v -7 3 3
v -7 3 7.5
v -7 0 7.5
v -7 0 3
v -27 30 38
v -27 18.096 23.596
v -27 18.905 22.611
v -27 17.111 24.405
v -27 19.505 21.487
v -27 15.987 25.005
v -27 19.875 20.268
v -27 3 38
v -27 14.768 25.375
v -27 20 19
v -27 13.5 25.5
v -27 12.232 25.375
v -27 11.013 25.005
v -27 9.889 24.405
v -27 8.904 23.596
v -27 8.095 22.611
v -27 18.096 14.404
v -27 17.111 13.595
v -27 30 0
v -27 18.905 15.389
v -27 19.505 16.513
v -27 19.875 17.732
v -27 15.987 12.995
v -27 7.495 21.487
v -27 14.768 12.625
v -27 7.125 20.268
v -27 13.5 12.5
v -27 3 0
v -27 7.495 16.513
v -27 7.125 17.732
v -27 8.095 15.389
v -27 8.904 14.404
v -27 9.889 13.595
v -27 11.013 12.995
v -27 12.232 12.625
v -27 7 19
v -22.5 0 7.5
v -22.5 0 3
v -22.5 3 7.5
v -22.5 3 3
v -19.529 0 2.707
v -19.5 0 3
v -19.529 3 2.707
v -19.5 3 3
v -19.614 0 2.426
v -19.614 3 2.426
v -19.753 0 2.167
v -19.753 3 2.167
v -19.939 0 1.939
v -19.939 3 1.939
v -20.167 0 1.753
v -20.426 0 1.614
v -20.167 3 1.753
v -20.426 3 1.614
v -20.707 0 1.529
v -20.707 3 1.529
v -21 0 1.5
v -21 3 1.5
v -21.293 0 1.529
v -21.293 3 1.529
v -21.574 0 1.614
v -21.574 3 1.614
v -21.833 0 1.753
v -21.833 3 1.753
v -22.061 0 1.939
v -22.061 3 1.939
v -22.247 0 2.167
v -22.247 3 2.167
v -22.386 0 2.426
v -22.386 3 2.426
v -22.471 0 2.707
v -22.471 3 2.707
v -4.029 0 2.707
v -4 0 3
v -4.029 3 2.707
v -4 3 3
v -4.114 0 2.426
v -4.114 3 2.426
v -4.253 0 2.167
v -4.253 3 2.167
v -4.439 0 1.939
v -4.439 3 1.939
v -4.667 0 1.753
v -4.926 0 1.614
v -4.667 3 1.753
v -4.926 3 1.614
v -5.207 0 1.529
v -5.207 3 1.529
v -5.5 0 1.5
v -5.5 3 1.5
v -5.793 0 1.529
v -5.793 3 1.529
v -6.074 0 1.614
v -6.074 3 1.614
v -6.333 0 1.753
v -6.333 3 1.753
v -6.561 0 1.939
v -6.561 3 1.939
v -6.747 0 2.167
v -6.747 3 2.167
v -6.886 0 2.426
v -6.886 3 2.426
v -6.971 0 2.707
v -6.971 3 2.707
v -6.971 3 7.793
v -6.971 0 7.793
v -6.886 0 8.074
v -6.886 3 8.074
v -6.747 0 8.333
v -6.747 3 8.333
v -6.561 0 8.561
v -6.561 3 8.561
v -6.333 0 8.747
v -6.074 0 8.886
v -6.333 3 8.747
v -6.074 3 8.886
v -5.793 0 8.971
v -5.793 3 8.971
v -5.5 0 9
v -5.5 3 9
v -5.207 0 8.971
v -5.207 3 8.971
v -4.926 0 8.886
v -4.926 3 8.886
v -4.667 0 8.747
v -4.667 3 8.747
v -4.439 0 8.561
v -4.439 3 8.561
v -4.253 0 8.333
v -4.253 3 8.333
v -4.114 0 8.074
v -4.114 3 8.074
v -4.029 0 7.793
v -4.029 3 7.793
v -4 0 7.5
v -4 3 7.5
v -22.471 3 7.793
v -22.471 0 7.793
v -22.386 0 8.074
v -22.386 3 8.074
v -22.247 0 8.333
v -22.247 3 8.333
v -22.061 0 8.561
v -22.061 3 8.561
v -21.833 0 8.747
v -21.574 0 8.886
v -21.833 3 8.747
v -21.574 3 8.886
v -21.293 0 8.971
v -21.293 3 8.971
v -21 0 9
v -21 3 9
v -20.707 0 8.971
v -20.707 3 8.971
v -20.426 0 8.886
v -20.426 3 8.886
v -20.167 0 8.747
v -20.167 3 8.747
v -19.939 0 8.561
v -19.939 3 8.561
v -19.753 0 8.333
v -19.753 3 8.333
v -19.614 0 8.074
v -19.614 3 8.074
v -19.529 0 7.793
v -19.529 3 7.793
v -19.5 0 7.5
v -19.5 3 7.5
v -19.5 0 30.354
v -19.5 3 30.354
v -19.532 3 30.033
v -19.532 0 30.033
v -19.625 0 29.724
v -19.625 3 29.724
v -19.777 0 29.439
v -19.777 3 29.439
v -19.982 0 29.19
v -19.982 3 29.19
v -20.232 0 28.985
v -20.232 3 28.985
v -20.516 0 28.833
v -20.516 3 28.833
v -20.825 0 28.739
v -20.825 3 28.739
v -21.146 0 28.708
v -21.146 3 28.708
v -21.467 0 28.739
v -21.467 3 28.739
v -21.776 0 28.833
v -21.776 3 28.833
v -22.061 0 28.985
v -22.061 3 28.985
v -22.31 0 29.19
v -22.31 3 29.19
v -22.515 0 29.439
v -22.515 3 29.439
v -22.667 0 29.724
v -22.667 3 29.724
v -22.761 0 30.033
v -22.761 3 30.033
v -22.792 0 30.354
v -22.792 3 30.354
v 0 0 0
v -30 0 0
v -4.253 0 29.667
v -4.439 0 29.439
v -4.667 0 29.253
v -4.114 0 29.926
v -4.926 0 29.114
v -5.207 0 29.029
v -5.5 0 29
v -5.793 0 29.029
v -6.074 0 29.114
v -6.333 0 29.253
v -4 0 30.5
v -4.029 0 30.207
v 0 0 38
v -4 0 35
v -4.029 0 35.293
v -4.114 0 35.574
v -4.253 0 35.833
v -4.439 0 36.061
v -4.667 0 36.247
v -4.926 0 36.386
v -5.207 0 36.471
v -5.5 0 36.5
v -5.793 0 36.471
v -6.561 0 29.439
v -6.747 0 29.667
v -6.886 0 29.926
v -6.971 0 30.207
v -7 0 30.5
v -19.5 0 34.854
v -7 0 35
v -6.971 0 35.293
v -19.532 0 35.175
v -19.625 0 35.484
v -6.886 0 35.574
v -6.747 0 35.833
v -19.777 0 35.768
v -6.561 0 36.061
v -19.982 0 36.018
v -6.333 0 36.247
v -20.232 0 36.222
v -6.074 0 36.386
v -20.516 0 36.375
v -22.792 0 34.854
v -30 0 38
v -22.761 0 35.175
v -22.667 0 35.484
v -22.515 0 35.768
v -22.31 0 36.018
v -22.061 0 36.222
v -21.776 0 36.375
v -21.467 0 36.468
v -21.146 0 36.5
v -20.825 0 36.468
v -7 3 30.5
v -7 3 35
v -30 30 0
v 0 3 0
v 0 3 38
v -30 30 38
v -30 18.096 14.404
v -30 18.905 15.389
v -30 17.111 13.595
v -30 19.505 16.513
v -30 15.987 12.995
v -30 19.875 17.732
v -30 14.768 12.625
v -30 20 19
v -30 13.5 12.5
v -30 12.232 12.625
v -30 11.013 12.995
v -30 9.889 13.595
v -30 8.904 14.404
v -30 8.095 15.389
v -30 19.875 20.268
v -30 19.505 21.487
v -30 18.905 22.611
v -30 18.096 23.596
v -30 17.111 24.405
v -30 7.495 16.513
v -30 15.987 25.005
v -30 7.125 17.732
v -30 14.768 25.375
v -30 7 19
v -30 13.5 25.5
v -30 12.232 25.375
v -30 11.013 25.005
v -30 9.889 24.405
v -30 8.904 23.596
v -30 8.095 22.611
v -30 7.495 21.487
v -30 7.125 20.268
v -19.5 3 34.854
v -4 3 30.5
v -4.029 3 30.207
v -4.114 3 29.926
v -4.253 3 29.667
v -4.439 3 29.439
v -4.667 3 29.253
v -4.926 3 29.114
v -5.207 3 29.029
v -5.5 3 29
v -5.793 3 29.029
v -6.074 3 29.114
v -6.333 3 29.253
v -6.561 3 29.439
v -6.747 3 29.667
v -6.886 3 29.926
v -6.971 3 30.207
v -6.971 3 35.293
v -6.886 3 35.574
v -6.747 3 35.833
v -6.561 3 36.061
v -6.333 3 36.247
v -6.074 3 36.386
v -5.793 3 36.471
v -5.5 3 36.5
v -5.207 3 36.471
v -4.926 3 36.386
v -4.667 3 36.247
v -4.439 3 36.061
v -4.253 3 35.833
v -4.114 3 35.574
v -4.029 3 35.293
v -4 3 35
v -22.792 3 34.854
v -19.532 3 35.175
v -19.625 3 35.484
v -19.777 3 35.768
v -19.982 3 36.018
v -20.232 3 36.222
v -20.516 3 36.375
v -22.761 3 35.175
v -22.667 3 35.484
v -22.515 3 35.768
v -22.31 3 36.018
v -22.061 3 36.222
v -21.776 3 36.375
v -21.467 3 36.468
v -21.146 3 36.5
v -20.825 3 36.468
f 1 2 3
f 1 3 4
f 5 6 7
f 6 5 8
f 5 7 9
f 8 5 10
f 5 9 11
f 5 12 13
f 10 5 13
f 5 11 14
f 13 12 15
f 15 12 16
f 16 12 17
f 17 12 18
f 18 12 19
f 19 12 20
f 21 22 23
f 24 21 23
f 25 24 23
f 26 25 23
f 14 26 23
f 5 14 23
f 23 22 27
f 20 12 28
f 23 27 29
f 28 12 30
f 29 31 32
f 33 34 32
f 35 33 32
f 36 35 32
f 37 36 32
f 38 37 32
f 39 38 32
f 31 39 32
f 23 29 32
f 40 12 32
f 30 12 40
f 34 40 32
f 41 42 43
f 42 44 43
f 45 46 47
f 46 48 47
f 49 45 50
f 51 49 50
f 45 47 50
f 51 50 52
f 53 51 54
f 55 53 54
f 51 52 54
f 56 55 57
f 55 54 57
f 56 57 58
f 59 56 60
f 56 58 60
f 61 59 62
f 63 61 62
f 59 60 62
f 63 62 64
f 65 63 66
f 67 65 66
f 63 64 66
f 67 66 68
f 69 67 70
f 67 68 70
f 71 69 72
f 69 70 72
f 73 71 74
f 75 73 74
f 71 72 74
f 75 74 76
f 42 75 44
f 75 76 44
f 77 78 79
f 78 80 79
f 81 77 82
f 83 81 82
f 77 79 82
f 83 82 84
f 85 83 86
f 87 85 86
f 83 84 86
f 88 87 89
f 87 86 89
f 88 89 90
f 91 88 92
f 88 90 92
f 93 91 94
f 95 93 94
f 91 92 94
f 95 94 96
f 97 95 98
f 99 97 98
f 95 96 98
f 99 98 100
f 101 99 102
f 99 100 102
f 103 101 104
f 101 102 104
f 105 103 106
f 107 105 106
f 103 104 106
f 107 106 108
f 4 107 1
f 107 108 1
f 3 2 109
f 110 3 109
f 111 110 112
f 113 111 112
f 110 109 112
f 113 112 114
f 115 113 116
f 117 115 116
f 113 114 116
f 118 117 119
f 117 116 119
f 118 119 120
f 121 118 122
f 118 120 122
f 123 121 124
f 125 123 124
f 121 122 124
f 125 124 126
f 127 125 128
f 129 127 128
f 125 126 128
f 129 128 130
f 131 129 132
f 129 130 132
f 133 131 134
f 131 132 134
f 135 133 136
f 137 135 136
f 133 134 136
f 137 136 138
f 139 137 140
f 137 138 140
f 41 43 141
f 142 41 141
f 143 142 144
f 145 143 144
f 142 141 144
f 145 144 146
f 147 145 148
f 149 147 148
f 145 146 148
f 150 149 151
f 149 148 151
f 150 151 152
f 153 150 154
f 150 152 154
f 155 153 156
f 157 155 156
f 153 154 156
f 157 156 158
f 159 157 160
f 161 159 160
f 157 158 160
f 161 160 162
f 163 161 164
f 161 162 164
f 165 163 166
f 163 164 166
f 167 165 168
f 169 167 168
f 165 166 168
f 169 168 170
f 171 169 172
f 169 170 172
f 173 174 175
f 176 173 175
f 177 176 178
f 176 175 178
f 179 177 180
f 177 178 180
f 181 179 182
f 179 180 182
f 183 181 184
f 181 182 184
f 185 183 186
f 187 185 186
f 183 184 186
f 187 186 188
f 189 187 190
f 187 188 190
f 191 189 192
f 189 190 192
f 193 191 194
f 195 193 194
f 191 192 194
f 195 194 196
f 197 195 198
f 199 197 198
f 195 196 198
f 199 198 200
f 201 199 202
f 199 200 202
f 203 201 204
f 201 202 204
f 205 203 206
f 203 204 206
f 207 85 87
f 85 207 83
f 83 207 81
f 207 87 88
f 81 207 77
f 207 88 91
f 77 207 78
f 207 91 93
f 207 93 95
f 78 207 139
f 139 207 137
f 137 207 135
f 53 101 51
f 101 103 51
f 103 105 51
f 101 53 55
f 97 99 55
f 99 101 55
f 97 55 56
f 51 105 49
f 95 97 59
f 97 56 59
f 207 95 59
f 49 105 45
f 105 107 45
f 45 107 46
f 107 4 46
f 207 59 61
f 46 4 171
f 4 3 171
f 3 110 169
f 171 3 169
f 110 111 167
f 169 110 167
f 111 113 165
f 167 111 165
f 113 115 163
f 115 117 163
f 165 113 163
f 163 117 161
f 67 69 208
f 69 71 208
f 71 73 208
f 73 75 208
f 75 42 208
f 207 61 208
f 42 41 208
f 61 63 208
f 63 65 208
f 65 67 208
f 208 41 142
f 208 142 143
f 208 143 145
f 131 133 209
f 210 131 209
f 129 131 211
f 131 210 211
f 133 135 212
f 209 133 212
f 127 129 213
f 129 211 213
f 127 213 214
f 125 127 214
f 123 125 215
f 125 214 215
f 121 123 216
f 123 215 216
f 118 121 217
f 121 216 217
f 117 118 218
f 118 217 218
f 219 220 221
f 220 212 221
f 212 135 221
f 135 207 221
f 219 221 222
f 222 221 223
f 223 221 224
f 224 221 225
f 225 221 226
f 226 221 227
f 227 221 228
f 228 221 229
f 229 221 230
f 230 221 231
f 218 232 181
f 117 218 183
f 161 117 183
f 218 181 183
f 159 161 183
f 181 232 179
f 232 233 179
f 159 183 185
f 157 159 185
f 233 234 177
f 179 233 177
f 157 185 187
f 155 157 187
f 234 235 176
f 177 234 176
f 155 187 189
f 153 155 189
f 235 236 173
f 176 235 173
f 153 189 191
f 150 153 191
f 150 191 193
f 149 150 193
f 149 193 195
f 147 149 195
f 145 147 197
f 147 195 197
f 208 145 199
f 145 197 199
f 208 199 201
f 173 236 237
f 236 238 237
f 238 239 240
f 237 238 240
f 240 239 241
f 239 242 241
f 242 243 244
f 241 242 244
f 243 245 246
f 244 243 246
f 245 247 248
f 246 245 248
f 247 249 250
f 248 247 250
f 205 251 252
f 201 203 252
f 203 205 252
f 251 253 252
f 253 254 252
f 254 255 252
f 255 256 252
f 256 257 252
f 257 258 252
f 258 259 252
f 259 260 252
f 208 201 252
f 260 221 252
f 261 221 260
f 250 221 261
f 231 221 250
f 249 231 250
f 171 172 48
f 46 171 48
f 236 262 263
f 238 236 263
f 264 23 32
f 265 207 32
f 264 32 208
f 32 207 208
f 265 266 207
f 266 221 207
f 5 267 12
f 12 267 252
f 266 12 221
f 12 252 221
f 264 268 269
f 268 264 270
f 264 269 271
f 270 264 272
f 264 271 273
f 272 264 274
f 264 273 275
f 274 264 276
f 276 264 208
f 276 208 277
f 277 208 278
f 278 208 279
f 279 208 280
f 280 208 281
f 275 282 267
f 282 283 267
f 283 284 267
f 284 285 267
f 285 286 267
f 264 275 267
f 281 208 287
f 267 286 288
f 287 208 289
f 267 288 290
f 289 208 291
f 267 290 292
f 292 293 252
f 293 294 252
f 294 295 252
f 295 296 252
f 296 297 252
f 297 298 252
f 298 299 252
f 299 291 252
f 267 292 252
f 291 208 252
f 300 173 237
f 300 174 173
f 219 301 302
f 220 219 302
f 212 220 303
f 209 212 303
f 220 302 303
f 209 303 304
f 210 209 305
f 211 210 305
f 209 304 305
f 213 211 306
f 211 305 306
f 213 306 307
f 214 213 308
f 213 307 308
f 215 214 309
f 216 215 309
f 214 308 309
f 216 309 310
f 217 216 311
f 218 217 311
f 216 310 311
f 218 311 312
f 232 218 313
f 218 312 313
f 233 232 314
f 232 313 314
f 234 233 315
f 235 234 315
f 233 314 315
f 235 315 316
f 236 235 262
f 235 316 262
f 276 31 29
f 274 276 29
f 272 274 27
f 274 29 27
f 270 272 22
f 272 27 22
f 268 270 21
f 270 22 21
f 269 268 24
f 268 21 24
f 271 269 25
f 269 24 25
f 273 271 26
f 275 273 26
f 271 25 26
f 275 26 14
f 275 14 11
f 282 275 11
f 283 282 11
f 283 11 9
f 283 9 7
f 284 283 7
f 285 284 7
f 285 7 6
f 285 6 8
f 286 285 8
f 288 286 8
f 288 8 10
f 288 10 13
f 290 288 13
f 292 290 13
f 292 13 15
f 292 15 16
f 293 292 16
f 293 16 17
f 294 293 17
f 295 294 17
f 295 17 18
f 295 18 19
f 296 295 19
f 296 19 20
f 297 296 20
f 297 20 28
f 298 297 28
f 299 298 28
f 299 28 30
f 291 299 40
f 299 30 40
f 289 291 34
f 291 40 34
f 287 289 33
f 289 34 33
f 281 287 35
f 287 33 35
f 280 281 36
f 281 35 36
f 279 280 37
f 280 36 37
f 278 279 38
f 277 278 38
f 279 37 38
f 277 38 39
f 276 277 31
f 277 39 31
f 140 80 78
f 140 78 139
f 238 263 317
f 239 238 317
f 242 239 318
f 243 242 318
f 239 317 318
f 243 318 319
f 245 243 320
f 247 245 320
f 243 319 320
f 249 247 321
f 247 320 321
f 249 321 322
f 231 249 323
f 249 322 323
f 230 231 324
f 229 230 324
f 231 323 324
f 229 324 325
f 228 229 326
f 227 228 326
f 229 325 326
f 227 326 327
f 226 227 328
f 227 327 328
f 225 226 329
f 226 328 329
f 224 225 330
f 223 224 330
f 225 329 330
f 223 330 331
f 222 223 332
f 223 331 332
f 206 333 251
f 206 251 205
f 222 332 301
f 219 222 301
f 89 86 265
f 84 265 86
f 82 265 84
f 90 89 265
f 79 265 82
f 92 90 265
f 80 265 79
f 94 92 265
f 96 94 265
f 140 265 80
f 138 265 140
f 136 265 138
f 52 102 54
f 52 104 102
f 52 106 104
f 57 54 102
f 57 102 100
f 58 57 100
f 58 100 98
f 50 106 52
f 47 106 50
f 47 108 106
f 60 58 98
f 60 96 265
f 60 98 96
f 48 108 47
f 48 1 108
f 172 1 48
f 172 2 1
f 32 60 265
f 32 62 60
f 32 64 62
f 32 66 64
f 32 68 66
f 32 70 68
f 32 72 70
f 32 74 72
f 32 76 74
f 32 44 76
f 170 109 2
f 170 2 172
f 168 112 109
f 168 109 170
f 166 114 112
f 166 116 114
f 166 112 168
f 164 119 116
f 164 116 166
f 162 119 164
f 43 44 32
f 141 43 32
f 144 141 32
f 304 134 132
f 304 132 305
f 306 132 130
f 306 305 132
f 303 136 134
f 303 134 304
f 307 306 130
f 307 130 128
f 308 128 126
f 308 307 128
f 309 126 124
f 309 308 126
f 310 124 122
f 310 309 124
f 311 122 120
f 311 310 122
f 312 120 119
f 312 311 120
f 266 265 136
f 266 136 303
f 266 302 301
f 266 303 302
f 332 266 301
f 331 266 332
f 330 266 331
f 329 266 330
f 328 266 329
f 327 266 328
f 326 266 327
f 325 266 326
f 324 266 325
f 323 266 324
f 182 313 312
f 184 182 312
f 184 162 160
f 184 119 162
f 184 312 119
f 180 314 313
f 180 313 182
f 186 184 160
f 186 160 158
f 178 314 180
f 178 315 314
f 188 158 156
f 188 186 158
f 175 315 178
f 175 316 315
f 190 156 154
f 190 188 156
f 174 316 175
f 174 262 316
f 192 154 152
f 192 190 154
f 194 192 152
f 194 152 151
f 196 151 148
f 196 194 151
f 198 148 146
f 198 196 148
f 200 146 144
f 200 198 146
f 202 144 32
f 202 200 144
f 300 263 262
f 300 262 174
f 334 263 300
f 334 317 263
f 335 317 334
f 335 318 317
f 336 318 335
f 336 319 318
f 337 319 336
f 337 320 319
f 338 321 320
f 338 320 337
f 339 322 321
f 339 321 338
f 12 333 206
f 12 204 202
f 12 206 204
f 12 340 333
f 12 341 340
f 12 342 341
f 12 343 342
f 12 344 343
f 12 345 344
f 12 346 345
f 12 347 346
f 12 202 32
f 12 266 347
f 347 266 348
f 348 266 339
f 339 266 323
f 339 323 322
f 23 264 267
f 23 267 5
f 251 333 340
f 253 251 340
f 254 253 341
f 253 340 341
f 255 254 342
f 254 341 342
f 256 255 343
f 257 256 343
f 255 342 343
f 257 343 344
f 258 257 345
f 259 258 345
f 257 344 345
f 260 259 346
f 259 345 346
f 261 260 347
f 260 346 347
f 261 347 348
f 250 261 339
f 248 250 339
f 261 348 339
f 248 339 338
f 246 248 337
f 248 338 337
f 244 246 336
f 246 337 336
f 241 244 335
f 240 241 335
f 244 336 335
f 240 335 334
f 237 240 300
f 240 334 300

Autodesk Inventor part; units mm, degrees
ref_plane "YZ Plane" through (0, 0, 0) normal (1, 0, 0) x (0, 1, 0)
ref_plane "XZ Plane" through (0, 0, 0) normal (0, 1, 0) x (-1, 0, 0)
ref_plane "XY Plane" through (0, 0, 0) normal (0, 0, 1) x (1, 0, 0)
sketch "Sketch1" plane through (0, 0, 0) normal (0, 1, 0) x (-1, 0, 0)
  line L0 (0, 0) -> (30, 0)
  line L1 (30, 0) -> (30, 38)
  line L2 (30, 38) -> (0, 38)
  line L3 (0, 38) -> (0, 0)
  dimension "d0" = 38
  dimension "d1" = 30
extrude "Extrusion1" add sketch "Sketch1" along normal blind 3
sketch "Sketch2" plane through (0, 3, 0) normal (0, 1, 0) x (1, 0, 0)
  line L0 (-30, 0) -> (-30, -38) projected
  line L1 (0, 0) -> (-30, 0) projected
  line L2 (-30, -38) -> (-27, -38)
  line L3 (-27, -38) -> (-27, 0)
  line L4 (-27, 0) -> (-30, 0)
  line L5 (-30, 0) -> (-30, -38)
  dimension "d4" = 3
extrude "Extrusion2" add sketch "Sketch2" along normal blind 27
sketch "Sketch3" plane through (-27, 3, 38) normal (1, 0, 0) x (0, 0, -1)
  circle A0 centre (19, 10.5) radius 6.5
  line L0 (38, 27) -> (0, 27) projected
  point P0 (38, -3)
  dimension "d7" = 13
  dimension "d8" = 16.5
extrude "Extrusion3" cut sketch "Sketch3" against normal up to surface (3 mm away)
sketch "Sketch4" plane through (0, 3, 0) normal (0, 1, 0) x (1, 0, 0)
  line L0 (0, 0) -> (-30, 0) projected
  line L1 (-27, -38) -> (-27, 0) projected
  line L2 (-27, -19) -> (0, -19) construction
  line L3 (-5.5, -35) -> (-5.5, -30.5) construction
  line L4 (-4, -35) -> (-4, -30.5)
  line L5 (-7, -30.5) -> (-7, -35)
  arc A0 (-7, -35) -> (-4, -35) centre (-5.5, -35) ccw
  arc A1 (-4, -30.5) -> (-7, -30.5) centre (-5.5, -30.5) ccw
  line L6 (-27, -38) -> (0, -38) projected
  line L7 (-5.5, -7.5) -> (-5.5, -3) construction
  line L8 (-7, -7.5) -> (-7, -3)
  line L9 (-4, -3) -> (-4, -7.5)
  arc A2 (-7, -7.5) -> (-4, -7.5) centre (-5.5, -7.5) ccw
  arc A3 (-4, -3) -> (-7, -3) centre (-5.5, -3) ccw
  line L10 (0, -38) -> (0, 0) projected
  line L11 (-4, -3) -> (-21, -3) construction
  line L12 (-21, -3) -> (-21, -7.5) construction
  line L13 (-22.5, -3) -> (-22.5, -7.5)
  line L14 (-19.5, -7.5) -> (-19.5, -3)
  arc A4 (-19.5, -3) -> (-22.5, -3) centre (-21, -3) ccw
  arc A5 (-22.5, -7.5) -> (-19.5, -7.5) centre (-21, -7.5) ccw
  line L15 (-21.1462, -34.8538) -> (-21.1462, -30.3538) construction
  line L16 (-22.7923, -34.8538) -> (-22.7923, -30.3538)
  line L17 (-19.5, -30.3538) -> (-19.5, -34.8538)
  arc A6 (-22.7923, -34.8538) -> (-19.5, -34.8538) centre (-21.1462, -34.8538) ccw
  arc A7 (-19.5, -30.3538) -> (-22.7923, -30.3538) centre (-21.1462, -30.3538) ccw
  point P0 (-5.5, -32.75)
  point P1 (-5.5, -5.25)
  point P2 (-21, -5.25)
  point P3 (-21.1462, -32.6038)
  dimension "d11" = 1.5
  dimension "d12" = 7.5
  dimension "d13" = 3
  dimension "d14" = 1.5
  dimension "d15" = 3
  dimension "d16" = 7.5
  dimension "d17" = 4
  dimension "d18" = 17
  dimension "d19" = 3
  dimension "d20" = 7.5
  dimension "d21" = 1.5
extrude "Extrusion4" cut sketch "Sketch4" against normal through all contours A0 L5 A1 L4 | L8 A3 L9 A2 | A4 L14 A5 L13 | L16 A7 L17 A6
equation "\"d14\" = d11"
equation "\"d15\" = d13"
equation "\"d16\" = d12"
equation "\"d19\" = d13"
properties part number "Big Motor Bracket"
